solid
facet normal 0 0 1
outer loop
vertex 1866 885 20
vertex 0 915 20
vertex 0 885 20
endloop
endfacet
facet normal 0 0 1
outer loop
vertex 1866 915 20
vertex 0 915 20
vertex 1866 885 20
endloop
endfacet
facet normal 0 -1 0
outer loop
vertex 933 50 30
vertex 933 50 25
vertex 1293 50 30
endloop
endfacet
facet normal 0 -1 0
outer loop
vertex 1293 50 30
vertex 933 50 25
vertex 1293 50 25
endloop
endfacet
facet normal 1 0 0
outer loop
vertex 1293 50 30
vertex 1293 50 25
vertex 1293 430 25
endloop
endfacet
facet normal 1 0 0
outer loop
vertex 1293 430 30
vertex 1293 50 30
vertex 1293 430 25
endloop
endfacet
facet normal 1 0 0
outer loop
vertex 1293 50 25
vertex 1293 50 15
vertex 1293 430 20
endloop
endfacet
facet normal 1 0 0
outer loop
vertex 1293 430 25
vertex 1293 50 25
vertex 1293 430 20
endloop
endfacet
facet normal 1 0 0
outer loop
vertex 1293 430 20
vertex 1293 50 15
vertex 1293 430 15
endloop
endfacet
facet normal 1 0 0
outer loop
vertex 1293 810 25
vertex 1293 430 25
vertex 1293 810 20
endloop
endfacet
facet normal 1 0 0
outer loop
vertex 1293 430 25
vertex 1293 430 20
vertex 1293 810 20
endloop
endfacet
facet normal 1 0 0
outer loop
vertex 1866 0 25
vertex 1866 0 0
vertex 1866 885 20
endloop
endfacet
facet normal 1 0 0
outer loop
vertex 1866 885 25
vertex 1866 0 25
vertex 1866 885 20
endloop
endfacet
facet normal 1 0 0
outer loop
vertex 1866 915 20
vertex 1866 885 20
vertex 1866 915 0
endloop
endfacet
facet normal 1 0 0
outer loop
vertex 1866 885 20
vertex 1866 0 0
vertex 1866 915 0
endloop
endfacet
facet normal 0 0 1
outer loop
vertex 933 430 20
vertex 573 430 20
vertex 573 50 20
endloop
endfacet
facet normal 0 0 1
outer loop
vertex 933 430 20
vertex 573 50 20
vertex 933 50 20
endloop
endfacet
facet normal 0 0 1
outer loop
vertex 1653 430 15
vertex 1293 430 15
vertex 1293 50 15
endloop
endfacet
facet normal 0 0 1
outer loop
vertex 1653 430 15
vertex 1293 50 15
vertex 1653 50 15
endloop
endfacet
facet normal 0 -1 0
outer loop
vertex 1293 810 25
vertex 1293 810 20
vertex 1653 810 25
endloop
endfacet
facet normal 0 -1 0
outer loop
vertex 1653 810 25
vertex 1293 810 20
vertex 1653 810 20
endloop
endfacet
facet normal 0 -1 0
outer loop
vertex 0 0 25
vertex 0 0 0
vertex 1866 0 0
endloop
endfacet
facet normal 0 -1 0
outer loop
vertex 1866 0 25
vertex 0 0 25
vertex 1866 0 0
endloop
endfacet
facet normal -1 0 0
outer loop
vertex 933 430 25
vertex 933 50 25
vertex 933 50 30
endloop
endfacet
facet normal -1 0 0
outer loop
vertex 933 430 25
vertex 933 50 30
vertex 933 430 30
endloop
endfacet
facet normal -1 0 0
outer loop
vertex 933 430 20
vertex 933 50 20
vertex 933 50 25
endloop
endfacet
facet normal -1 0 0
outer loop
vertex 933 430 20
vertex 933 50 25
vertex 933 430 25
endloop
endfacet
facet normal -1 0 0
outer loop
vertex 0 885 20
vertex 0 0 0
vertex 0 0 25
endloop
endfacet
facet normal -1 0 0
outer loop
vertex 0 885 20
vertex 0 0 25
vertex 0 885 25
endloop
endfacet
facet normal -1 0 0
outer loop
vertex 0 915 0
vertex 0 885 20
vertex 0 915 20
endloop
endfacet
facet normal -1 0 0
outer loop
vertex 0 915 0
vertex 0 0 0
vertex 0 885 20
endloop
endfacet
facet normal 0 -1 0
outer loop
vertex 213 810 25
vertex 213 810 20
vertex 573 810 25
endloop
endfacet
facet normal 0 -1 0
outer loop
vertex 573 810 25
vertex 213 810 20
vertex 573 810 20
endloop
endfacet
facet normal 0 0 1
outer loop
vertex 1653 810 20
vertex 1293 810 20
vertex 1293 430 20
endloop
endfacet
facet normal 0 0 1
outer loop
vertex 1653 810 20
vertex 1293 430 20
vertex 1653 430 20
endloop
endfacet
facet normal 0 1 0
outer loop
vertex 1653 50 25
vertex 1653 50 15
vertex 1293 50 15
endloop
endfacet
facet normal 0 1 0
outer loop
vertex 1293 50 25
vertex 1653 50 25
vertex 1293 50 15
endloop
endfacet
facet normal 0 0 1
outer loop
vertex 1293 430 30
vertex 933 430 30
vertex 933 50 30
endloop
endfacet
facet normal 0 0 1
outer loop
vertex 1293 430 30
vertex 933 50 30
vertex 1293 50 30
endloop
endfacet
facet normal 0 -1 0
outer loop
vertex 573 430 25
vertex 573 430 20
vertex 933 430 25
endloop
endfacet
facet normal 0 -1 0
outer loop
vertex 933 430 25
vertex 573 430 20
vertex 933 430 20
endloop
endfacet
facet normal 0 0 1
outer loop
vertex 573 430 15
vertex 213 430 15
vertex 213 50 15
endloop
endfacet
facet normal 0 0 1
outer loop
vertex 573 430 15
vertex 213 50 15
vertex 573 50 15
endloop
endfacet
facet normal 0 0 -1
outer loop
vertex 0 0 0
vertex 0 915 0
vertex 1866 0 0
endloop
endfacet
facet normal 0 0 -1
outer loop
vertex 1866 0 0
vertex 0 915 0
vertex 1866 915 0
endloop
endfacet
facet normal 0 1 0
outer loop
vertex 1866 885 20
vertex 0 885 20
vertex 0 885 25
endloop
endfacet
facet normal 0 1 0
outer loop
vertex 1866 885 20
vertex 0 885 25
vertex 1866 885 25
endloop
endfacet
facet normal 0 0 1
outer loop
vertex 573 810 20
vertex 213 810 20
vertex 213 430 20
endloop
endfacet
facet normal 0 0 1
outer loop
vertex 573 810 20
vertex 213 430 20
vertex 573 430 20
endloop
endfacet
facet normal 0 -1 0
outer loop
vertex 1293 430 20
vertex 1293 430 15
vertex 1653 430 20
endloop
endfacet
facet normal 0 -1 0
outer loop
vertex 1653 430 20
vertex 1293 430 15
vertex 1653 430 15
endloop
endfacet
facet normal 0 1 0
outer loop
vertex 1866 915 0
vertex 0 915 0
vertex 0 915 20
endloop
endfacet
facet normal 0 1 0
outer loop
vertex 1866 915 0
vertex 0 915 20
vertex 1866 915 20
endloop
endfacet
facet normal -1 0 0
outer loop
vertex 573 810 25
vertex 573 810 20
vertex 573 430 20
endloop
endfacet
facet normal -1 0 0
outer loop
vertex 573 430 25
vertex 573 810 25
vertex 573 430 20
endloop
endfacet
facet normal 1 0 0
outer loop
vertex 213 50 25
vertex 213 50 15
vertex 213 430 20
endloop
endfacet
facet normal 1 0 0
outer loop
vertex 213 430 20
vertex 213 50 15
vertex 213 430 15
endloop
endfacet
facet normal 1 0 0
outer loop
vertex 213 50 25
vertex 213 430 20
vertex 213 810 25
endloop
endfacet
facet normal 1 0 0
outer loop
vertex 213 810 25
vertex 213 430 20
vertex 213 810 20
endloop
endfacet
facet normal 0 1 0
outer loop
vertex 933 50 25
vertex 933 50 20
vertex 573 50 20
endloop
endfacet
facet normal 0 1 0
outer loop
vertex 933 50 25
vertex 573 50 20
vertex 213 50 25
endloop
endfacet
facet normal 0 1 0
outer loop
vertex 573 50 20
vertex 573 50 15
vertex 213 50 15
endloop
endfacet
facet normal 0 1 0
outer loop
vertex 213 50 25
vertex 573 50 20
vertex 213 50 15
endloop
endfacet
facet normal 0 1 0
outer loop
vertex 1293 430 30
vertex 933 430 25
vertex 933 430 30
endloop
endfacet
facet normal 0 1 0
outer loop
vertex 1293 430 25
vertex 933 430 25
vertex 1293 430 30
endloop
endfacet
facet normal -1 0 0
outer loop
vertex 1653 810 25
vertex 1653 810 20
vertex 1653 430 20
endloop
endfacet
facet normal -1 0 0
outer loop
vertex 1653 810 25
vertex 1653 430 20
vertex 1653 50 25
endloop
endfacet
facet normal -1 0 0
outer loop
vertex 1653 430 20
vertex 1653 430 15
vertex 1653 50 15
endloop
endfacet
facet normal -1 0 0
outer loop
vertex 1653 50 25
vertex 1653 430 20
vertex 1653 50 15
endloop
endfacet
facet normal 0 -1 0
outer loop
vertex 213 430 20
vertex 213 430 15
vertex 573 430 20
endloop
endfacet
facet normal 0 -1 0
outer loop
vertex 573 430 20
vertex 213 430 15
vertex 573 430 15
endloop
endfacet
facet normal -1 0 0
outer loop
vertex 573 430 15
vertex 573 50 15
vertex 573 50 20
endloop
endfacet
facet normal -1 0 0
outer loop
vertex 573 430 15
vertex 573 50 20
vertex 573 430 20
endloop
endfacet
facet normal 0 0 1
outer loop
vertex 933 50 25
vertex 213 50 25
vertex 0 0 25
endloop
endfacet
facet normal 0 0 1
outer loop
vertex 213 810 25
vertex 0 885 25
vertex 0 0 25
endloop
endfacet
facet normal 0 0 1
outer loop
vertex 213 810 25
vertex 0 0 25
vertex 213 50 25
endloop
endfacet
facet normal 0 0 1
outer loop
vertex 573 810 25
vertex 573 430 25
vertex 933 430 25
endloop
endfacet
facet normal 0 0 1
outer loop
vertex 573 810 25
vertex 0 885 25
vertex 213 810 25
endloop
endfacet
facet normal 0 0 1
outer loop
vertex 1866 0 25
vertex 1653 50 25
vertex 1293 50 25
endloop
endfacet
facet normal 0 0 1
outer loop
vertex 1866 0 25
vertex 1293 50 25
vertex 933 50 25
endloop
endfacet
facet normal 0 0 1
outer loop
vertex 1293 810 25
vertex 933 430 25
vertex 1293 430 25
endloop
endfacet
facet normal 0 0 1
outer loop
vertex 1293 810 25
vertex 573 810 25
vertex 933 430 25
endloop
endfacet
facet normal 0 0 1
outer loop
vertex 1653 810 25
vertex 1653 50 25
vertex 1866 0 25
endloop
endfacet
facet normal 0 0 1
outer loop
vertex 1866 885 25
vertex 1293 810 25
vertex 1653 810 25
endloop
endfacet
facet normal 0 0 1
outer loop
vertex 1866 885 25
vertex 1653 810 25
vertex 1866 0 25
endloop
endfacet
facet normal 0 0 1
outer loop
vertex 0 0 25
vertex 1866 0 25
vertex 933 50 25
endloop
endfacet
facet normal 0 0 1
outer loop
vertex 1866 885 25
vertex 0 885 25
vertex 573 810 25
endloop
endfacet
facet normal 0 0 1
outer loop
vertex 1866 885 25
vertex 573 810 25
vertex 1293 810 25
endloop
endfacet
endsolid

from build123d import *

# Parameters (mm, degrees)
F0_W     = 1866
F0_H     = 885
F1_DEPTH = 25
F0_H_2   = 30
F0_W_2   = 360
F0_H_3   = 380
F2_DEPTH = 20
F3_DEPTH = 15
F4_DEPTH = 30


with BuildPart() as f1:
    # F0 (on Top) → F1 (new body)
    with BuildSketch(Plane.XY):
        with Locations((933, 442.5)):
            Rectangle(F0_W, F0_H)
        Polygon((573, 50), (213, 50), (213, 430), (213, 810), (573, 810), (573, 430), (933, 430), (1293, 430), (1293, 810), (1653, 810), (1653, 430), (1653, 50), (1293, 50), (933, 50), align=None, mode=Mode.SUBTRACT)
    extrude(amount=F1_DEPTH)

    # F0 (on Top) → F2 (join)
    with BuildSketch(Plane.XY):
        with Locations((933, 900)):
            Rectangle(F0_W, F0_H_2)
        with Locations((393, 620)):
            Rectangle(F0_W_2, F0_H_3)
        with Locations((753, 240)):
            Rectangle(F0_W_2, F0_H_3)
        with Locations((1473, 620)):
            Rectangle(F0_W_2, F0_H_3)
    extrude(amount=F2_DEPTH)

    # F0 (on Top) → F3 (join)
    with BuildSketch(Plane.XY):
        with Locations((1473, 240)):
            Rectangle(F0_W_2, F0_H_3)
        with Locations((393, 240)):
            Rectangle(F0_W_2, F0_H_3)
    extrude(amount=F3_DEPTH)

    # F0 (on Top) → F4 (join)
    with BuildSketch(Plane.XY):
        with Locations((1113, 240)):
            Rectangle(F0_W_2, F0_H_3)
    extrude(amount=F4_DEPTH)


solid = f1.part
